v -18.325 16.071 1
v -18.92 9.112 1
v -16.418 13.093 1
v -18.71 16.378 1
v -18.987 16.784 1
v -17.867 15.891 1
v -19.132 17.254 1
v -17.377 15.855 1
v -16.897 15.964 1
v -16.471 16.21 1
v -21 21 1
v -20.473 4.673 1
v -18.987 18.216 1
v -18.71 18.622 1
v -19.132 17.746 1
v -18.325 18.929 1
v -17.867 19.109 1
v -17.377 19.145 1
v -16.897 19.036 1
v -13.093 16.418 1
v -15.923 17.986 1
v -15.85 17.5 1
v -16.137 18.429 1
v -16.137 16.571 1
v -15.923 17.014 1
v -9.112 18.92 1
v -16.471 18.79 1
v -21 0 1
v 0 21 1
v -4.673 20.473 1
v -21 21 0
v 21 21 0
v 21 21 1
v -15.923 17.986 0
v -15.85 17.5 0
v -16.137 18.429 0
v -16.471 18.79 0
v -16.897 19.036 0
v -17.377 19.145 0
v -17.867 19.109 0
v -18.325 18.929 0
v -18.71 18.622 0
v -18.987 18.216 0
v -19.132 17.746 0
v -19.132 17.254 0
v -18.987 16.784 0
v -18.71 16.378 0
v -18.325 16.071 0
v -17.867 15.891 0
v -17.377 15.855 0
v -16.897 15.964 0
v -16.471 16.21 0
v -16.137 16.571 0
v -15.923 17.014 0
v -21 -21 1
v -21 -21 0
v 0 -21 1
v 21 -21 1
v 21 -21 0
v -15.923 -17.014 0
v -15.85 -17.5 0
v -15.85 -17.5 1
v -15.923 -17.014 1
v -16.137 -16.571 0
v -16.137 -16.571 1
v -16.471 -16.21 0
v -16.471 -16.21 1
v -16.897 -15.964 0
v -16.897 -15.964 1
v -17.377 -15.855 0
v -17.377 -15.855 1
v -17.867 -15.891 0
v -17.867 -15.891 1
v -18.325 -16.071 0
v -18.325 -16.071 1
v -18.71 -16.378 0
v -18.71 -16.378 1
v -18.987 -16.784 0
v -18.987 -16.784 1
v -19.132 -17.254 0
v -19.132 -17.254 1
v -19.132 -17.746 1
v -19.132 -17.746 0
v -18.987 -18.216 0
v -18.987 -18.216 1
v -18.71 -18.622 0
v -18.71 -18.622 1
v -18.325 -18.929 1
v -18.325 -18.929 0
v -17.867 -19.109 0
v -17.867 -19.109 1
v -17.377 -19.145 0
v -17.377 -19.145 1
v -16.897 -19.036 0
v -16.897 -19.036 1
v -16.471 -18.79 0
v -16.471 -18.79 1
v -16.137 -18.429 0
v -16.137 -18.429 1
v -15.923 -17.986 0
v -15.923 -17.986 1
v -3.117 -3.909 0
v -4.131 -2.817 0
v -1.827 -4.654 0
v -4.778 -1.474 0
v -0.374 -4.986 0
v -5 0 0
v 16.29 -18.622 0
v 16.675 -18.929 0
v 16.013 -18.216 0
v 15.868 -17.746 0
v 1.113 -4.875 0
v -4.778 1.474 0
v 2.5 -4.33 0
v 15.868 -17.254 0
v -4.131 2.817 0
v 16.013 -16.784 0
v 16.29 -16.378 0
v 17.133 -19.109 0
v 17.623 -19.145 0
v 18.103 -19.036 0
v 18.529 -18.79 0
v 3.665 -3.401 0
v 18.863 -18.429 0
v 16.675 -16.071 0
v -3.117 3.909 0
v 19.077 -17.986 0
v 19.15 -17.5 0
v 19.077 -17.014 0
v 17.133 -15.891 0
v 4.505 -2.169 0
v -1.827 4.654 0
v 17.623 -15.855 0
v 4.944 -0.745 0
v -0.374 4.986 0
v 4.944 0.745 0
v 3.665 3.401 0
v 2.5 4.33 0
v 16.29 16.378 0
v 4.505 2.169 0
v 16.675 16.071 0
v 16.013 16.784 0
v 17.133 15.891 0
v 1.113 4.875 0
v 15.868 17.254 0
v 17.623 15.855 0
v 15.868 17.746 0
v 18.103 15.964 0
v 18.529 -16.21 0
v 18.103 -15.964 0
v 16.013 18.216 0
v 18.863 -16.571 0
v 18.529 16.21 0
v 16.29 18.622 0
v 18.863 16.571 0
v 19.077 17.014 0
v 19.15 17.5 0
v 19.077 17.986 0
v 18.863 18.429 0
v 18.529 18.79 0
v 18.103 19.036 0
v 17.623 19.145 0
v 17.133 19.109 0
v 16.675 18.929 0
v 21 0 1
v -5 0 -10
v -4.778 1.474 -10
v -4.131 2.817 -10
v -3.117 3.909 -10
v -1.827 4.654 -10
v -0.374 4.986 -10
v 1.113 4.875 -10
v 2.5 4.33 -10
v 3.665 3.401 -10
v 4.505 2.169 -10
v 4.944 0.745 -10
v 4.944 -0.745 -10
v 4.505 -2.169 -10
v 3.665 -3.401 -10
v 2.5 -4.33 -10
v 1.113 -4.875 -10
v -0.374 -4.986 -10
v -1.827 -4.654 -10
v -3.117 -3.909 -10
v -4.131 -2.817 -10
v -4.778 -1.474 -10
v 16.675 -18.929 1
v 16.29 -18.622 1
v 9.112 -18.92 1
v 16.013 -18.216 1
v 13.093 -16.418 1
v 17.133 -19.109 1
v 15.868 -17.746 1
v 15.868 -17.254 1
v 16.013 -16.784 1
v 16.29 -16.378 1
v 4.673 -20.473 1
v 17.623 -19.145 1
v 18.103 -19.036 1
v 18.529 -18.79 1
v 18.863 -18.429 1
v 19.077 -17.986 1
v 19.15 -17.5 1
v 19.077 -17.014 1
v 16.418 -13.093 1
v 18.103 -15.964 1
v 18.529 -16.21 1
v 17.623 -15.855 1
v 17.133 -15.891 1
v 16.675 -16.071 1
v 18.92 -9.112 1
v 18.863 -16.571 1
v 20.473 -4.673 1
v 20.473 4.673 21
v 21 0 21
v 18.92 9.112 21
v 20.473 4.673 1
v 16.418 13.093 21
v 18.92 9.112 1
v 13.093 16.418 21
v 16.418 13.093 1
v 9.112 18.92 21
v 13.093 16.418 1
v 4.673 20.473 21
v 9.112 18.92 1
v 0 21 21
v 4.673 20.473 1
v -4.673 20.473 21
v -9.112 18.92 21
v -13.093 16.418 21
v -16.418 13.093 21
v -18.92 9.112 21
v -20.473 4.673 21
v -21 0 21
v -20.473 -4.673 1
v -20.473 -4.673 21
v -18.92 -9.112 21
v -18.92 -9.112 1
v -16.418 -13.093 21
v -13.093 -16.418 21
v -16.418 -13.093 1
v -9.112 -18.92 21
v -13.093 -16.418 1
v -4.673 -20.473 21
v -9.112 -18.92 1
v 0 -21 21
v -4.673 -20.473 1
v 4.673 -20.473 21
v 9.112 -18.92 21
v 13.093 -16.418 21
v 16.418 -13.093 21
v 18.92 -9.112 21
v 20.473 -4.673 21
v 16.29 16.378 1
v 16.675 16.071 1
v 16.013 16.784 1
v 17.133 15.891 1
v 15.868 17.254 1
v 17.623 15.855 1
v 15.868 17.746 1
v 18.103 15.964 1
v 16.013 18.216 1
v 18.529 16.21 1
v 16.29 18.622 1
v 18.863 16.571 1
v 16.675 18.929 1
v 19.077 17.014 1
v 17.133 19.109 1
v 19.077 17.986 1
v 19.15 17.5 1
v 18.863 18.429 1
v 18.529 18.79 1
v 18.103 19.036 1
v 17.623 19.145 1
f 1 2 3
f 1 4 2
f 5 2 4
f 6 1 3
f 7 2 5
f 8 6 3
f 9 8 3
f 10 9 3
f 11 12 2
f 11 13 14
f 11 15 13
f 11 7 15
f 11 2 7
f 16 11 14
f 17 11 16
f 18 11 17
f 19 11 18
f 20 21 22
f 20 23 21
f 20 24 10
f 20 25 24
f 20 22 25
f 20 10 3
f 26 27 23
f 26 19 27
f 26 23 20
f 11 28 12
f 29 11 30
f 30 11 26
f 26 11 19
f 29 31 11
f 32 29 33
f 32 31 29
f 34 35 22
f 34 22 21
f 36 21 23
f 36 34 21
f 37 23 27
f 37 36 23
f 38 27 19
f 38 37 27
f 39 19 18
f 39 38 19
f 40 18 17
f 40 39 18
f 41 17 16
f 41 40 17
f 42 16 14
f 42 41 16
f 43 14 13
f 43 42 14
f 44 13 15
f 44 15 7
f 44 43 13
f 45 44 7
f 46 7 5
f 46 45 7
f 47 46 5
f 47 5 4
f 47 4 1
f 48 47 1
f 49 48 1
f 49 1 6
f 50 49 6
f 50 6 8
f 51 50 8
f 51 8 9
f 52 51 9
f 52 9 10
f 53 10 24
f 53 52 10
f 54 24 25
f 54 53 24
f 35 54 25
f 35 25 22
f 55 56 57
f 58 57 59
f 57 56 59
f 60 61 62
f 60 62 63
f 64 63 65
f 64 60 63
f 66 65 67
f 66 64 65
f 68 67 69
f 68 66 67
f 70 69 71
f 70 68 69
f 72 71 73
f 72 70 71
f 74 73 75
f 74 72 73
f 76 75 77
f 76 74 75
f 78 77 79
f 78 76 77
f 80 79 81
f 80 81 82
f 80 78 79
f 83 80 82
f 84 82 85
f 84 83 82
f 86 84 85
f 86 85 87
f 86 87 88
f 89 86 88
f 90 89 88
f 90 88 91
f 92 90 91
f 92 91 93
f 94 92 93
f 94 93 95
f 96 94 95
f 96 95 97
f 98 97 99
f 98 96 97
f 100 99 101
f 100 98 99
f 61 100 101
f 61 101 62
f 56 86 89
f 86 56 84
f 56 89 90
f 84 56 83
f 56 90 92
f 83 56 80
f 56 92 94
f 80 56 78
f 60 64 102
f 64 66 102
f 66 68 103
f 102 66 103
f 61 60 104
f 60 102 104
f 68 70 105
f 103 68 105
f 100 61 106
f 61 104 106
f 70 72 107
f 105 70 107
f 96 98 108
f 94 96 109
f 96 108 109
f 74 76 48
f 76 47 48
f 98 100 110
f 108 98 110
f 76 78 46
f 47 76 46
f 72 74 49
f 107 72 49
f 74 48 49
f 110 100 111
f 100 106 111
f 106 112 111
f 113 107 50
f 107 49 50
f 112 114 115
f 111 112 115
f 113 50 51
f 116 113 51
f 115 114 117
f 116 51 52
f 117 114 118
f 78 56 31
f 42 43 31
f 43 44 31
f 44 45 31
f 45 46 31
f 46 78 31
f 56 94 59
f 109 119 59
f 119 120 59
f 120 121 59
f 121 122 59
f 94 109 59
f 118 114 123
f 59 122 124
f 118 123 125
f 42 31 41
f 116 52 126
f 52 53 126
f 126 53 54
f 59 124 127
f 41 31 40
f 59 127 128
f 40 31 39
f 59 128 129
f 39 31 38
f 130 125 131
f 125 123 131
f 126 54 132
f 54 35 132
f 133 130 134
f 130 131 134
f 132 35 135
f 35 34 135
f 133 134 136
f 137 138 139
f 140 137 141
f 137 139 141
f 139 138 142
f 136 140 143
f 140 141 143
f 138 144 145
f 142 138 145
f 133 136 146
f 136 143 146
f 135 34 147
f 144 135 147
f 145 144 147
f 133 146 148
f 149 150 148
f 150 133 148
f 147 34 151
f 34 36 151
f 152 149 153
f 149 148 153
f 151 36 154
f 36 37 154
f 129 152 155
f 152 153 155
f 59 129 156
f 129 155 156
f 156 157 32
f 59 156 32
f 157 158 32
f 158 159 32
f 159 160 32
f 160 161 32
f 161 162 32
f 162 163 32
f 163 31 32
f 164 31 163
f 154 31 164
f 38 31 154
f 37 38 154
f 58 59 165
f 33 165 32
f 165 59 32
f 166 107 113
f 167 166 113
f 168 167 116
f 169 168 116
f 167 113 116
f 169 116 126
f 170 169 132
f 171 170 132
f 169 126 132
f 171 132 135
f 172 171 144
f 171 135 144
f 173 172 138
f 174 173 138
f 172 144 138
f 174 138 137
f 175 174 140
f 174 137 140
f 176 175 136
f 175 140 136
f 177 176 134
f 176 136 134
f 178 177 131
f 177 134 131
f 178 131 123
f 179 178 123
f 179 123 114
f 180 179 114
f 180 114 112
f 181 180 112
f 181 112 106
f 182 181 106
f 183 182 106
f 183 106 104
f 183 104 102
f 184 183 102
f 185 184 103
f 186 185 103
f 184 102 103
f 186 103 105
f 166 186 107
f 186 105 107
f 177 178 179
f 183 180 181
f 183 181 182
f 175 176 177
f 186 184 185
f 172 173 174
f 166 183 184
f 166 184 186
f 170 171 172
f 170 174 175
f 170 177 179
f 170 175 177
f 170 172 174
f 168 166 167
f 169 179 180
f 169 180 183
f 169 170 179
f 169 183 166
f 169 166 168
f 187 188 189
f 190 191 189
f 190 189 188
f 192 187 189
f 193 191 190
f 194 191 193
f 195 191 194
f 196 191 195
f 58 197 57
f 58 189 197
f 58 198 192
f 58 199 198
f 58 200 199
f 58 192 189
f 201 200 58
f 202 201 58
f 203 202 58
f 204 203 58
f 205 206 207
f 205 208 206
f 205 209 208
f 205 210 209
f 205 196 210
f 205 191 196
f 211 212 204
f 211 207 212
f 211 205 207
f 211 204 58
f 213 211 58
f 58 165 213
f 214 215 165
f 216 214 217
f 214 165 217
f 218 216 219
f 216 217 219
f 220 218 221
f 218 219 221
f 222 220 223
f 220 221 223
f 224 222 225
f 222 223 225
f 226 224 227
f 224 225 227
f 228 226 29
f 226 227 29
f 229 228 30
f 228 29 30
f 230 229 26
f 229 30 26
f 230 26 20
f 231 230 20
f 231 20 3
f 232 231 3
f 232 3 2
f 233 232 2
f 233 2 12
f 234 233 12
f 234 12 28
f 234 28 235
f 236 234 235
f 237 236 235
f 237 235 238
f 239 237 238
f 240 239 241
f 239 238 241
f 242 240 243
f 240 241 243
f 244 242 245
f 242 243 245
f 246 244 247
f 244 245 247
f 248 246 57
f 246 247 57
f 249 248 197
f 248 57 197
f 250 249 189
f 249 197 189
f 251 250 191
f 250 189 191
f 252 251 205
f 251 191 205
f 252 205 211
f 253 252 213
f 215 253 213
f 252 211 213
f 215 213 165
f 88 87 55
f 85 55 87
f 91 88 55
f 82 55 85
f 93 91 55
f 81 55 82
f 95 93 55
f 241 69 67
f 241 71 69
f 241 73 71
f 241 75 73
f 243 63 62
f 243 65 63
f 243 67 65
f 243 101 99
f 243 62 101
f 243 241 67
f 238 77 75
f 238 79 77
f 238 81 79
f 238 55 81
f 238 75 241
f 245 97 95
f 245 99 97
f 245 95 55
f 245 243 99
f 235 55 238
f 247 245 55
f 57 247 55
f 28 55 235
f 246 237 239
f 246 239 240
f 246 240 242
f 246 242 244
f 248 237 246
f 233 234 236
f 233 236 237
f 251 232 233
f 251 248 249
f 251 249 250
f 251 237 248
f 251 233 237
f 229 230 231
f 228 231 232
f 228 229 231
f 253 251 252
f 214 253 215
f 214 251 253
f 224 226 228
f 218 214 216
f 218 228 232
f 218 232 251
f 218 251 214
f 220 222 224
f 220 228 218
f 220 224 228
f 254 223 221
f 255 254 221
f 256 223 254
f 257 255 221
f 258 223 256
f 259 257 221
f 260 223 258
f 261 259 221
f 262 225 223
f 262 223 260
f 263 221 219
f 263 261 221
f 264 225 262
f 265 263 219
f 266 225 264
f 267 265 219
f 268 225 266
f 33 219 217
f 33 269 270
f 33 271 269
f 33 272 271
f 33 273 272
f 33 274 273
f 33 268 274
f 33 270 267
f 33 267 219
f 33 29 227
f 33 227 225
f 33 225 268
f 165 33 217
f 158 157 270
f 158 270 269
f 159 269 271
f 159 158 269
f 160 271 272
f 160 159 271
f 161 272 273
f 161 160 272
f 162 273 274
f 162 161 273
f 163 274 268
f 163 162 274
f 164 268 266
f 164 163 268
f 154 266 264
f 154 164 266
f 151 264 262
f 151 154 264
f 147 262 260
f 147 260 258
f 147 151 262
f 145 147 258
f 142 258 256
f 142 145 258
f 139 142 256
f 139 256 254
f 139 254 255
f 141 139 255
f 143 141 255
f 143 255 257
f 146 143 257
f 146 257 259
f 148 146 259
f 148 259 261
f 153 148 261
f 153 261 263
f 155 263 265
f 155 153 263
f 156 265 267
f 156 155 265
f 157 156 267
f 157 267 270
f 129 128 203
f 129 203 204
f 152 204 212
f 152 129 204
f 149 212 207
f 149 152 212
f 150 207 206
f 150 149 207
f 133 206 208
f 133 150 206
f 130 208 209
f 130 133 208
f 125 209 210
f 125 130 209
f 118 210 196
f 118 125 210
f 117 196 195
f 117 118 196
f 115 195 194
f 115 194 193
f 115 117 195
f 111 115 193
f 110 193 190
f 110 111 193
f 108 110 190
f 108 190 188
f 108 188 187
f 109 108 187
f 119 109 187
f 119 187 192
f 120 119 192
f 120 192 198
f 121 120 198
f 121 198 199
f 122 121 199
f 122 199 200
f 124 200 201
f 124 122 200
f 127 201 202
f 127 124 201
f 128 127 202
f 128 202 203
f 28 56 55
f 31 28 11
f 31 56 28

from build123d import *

# Parameters (mm, degrees)
SKETCH1_W           = 42
SKETCH1_H           = 42
SKETCH1_R           = 1.65
BOSS_EXTRUDE1_DEPTH = 1
SKETCH2_R           = 21
BOSS_EXTRUDE2_DEPTH = 20
SKETCH3_R           = 5
BOSS_EXTRUDE3_DEPTH = 10


with BuildPart() as part:
    # Sketch1 → Boss-Extrude1 (new body)
    with BuildSketch(Plane.XY):
        Rectangle(SKETCH1_W, SKETCH1_H)
        with Locations((-17.5, 17.5)):
            Circle(SKETCH1_R, mode=Mode.SUBTRACT)
        with Locations((17.5, 17.5)):
            Circle(SKETCH1_R, mode=Mode.SUBTRACT)
        with Locations((17.5, -17.5)):
            Circle(SKETCH1_R, mode=Mode.SUBTRACT)
        with Locations((-17.5, -17.5)):
            Circle(SKETCH1_R, mode=Mode.SUBTRACT)
    extrude(amount=BOSS_EXTRUDE1_DEPTH)

    # Sketch2 → Boss-Extrude2 (add)
    with BuildSketch(Plane.XY.offset(1)):
        Circle(SKETCH2_R)
    extrude(amount=BOSS_EXTRUDE2_DEPTH)

    # Sketch3 → Boss-Extrude3 (add)
    with BuildSketch(Plane(origin=(0, 0, 0), x_dir=(-1, 0, 0), z_dir=(0, 0, -1))):
        Circle(SKETCH3_R)
    extrude(amount=BOSS_EXTRUDE3_DEPTH)


solid = part.part
